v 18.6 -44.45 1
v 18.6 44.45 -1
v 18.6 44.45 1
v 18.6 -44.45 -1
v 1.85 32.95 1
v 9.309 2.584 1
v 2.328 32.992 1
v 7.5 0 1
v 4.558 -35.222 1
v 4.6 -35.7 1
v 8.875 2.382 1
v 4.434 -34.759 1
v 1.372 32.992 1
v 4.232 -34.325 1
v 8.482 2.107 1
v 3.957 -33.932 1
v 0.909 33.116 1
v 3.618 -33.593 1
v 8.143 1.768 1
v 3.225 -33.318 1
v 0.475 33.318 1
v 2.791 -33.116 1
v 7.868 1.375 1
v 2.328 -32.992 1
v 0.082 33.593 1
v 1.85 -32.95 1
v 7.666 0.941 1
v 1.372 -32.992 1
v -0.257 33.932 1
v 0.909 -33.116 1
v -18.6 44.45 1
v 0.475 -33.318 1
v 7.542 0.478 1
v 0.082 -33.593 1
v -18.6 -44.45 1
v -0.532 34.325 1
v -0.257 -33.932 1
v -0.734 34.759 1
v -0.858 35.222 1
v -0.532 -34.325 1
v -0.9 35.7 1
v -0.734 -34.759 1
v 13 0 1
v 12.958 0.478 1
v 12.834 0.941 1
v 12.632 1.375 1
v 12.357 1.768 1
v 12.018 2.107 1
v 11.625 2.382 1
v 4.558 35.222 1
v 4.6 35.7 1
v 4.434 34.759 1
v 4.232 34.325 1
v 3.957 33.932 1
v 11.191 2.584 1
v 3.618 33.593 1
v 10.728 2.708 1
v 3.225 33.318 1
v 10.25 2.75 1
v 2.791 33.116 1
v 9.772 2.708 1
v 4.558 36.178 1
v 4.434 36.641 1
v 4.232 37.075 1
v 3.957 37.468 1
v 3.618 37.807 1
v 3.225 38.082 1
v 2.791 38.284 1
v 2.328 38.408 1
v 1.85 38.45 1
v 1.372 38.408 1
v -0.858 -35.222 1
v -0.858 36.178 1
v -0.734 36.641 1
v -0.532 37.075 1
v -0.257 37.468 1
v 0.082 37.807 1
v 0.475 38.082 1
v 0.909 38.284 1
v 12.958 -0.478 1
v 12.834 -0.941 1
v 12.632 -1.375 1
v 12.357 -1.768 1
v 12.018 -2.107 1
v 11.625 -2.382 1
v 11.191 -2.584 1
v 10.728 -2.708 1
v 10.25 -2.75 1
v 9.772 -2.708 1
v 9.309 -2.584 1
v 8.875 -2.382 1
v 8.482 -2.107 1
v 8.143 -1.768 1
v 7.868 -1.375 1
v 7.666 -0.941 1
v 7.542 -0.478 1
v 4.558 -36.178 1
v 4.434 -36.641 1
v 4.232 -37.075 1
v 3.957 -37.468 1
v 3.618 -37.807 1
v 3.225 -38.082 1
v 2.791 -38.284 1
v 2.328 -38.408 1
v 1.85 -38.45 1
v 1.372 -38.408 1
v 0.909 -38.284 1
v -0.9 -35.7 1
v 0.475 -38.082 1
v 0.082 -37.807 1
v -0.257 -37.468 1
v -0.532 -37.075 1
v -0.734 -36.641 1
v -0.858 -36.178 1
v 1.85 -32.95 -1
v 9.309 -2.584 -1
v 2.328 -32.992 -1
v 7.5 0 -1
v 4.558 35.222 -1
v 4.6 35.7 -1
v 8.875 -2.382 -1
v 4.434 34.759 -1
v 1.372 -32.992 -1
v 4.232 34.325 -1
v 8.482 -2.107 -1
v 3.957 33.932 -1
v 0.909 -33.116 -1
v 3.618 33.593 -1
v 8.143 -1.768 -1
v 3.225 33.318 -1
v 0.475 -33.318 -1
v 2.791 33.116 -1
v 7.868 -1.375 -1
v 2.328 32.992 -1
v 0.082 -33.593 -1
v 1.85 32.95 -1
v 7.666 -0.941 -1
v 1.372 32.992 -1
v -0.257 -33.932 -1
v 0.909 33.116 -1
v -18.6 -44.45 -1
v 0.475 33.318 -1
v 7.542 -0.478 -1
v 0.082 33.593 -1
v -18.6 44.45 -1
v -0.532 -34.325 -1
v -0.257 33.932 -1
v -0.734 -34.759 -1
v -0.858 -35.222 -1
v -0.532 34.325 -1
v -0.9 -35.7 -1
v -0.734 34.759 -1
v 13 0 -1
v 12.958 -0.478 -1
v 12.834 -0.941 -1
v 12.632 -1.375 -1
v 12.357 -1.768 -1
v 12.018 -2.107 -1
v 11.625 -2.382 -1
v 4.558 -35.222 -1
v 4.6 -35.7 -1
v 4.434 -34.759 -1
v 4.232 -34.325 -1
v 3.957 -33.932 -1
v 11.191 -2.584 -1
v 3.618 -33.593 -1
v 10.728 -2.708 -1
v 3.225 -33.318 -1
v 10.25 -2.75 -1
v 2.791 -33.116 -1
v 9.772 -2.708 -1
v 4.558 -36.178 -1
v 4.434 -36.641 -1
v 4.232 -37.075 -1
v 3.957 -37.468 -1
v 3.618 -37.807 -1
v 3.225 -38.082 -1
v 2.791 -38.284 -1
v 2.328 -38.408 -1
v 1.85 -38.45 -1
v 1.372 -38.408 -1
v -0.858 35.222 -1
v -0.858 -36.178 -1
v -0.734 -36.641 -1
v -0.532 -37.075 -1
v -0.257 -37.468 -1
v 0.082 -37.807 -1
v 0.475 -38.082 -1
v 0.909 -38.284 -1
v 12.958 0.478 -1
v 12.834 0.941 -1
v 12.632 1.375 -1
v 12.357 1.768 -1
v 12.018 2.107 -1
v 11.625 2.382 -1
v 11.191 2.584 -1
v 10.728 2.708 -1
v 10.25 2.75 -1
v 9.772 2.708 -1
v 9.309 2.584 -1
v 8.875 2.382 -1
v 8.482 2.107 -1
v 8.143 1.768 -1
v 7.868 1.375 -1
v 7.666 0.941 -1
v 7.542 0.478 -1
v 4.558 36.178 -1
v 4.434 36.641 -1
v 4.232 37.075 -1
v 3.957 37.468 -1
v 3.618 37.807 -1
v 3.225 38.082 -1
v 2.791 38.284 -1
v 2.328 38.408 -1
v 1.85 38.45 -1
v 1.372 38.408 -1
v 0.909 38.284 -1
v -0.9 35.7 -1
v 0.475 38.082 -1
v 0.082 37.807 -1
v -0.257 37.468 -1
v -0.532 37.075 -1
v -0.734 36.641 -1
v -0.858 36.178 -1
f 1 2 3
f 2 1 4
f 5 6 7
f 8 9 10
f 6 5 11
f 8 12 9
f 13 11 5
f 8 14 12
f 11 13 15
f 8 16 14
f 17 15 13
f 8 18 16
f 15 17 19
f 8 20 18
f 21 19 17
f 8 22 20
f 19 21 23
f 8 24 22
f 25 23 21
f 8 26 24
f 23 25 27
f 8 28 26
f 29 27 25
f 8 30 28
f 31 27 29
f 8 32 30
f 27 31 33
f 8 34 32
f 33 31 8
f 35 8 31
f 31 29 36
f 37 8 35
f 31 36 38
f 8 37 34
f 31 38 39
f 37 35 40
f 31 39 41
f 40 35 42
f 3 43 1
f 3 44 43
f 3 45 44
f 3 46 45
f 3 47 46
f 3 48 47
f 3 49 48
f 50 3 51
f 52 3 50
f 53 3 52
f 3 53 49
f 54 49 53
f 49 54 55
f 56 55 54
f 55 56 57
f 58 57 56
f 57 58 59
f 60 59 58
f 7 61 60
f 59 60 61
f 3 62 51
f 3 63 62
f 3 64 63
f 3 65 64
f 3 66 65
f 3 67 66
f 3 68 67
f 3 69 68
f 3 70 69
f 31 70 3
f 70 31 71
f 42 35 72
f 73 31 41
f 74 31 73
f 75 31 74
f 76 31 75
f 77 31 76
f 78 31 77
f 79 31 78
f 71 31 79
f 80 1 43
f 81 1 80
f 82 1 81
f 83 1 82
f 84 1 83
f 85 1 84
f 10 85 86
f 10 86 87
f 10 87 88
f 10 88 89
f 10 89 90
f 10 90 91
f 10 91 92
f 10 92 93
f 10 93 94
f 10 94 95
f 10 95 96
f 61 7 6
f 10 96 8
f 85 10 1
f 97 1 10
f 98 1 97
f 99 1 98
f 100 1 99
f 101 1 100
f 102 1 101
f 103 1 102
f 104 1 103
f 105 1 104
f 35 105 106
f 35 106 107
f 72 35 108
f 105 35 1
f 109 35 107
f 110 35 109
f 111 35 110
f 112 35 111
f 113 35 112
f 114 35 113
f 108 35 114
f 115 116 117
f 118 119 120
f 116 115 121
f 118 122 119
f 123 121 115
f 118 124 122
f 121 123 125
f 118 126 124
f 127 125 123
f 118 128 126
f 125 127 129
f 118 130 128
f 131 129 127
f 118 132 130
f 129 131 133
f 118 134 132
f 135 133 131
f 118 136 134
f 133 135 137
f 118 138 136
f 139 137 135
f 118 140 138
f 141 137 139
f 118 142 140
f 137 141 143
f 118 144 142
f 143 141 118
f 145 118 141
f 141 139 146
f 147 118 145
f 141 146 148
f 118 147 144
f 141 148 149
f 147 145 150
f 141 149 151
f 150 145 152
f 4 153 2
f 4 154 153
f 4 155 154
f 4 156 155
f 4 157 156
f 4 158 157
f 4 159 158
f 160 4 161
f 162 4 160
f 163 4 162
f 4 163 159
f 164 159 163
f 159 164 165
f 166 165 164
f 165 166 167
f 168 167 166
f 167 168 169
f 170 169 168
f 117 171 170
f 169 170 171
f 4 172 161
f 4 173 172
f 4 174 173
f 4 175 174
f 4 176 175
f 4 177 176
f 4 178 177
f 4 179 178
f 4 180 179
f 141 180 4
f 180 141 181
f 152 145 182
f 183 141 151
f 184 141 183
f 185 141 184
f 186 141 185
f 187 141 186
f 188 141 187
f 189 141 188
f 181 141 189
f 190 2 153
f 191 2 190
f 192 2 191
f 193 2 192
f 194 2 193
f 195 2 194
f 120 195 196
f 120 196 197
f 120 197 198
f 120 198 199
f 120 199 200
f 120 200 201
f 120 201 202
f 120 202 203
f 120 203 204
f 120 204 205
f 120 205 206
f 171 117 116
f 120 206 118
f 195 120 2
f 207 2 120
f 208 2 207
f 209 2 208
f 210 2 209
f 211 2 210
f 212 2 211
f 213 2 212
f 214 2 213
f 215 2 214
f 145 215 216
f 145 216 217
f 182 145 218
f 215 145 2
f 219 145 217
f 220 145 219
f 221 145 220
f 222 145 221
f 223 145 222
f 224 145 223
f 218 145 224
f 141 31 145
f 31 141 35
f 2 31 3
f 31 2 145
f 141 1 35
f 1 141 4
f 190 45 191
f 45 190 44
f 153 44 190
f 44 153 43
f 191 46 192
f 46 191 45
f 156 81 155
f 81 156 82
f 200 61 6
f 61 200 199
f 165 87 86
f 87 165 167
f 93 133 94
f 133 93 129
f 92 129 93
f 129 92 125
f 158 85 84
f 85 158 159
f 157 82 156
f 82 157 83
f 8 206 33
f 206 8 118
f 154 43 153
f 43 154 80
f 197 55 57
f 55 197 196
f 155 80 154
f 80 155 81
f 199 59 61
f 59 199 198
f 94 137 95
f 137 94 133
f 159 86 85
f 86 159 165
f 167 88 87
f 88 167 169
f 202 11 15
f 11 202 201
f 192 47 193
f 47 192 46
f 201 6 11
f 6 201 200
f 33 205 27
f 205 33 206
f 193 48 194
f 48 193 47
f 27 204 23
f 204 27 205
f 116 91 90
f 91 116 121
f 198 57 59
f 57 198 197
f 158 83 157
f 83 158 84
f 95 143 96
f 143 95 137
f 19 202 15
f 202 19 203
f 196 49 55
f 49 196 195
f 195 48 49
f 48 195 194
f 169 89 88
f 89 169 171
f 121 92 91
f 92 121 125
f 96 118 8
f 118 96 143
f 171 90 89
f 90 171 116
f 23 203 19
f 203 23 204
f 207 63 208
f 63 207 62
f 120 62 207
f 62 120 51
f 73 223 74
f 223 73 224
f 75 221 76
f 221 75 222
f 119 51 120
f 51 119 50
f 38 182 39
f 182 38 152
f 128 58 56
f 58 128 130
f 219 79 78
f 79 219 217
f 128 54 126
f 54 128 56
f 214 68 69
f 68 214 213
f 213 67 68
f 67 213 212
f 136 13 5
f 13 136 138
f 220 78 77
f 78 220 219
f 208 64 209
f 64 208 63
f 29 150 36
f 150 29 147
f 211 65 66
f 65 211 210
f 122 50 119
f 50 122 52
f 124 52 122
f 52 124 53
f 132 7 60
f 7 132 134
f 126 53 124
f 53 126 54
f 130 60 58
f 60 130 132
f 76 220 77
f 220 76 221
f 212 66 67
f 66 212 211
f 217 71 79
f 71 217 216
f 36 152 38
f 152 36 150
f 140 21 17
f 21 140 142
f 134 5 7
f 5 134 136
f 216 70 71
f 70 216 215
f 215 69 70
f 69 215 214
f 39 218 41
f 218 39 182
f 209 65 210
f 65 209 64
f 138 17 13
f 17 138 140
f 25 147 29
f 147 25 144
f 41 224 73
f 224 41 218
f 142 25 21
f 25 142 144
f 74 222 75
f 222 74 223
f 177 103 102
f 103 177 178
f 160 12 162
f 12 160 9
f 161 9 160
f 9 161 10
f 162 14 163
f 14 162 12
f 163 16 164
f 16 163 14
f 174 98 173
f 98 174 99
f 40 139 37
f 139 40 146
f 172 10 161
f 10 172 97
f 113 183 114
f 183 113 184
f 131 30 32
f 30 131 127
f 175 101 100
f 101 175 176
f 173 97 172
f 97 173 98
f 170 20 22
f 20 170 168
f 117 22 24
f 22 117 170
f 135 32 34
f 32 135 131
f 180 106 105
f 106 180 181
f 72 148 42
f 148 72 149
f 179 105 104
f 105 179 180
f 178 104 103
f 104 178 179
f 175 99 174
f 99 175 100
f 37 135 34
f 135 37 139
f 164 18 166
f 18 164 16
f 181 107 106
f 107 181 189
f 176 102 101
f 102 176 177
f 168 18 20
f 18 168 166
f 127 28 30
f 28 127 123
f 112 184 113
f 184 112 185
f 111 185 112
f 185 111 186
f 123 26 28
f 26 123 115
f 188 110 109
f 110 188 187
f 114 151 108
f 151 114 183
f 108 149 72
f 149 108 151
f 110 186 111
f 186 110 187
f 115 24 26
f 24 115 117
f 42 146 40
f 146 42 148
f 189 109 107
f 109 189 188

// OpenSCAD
bx = 37.2;
by = 88.9;
bz = 2;

$fn = 36;

holed = 5.5;

mhx = 5.6;
ohx = 14;
ohy = 6;

difference() {
    cube([bx,by,bz], center=true);
    
    translate([(bx/2)-(holed/2)-mhx,0,0]){
        #cylinder(d=holed, h=bz+1, center=true);
    }
    
    translate([(bx/2)-(holed/2)-ohx,((by/2)-(holed/2)-ohy),0]){
        #cylinder(d=holed, h=bz+1, center=true);
    }
    
    translate([(bx/2)-(holed/2)-ohx,-((by/2)-(holed/2)-ohy),0]){
        #cylinder(d=holed, h=bz+1, center=true);
    }
}
